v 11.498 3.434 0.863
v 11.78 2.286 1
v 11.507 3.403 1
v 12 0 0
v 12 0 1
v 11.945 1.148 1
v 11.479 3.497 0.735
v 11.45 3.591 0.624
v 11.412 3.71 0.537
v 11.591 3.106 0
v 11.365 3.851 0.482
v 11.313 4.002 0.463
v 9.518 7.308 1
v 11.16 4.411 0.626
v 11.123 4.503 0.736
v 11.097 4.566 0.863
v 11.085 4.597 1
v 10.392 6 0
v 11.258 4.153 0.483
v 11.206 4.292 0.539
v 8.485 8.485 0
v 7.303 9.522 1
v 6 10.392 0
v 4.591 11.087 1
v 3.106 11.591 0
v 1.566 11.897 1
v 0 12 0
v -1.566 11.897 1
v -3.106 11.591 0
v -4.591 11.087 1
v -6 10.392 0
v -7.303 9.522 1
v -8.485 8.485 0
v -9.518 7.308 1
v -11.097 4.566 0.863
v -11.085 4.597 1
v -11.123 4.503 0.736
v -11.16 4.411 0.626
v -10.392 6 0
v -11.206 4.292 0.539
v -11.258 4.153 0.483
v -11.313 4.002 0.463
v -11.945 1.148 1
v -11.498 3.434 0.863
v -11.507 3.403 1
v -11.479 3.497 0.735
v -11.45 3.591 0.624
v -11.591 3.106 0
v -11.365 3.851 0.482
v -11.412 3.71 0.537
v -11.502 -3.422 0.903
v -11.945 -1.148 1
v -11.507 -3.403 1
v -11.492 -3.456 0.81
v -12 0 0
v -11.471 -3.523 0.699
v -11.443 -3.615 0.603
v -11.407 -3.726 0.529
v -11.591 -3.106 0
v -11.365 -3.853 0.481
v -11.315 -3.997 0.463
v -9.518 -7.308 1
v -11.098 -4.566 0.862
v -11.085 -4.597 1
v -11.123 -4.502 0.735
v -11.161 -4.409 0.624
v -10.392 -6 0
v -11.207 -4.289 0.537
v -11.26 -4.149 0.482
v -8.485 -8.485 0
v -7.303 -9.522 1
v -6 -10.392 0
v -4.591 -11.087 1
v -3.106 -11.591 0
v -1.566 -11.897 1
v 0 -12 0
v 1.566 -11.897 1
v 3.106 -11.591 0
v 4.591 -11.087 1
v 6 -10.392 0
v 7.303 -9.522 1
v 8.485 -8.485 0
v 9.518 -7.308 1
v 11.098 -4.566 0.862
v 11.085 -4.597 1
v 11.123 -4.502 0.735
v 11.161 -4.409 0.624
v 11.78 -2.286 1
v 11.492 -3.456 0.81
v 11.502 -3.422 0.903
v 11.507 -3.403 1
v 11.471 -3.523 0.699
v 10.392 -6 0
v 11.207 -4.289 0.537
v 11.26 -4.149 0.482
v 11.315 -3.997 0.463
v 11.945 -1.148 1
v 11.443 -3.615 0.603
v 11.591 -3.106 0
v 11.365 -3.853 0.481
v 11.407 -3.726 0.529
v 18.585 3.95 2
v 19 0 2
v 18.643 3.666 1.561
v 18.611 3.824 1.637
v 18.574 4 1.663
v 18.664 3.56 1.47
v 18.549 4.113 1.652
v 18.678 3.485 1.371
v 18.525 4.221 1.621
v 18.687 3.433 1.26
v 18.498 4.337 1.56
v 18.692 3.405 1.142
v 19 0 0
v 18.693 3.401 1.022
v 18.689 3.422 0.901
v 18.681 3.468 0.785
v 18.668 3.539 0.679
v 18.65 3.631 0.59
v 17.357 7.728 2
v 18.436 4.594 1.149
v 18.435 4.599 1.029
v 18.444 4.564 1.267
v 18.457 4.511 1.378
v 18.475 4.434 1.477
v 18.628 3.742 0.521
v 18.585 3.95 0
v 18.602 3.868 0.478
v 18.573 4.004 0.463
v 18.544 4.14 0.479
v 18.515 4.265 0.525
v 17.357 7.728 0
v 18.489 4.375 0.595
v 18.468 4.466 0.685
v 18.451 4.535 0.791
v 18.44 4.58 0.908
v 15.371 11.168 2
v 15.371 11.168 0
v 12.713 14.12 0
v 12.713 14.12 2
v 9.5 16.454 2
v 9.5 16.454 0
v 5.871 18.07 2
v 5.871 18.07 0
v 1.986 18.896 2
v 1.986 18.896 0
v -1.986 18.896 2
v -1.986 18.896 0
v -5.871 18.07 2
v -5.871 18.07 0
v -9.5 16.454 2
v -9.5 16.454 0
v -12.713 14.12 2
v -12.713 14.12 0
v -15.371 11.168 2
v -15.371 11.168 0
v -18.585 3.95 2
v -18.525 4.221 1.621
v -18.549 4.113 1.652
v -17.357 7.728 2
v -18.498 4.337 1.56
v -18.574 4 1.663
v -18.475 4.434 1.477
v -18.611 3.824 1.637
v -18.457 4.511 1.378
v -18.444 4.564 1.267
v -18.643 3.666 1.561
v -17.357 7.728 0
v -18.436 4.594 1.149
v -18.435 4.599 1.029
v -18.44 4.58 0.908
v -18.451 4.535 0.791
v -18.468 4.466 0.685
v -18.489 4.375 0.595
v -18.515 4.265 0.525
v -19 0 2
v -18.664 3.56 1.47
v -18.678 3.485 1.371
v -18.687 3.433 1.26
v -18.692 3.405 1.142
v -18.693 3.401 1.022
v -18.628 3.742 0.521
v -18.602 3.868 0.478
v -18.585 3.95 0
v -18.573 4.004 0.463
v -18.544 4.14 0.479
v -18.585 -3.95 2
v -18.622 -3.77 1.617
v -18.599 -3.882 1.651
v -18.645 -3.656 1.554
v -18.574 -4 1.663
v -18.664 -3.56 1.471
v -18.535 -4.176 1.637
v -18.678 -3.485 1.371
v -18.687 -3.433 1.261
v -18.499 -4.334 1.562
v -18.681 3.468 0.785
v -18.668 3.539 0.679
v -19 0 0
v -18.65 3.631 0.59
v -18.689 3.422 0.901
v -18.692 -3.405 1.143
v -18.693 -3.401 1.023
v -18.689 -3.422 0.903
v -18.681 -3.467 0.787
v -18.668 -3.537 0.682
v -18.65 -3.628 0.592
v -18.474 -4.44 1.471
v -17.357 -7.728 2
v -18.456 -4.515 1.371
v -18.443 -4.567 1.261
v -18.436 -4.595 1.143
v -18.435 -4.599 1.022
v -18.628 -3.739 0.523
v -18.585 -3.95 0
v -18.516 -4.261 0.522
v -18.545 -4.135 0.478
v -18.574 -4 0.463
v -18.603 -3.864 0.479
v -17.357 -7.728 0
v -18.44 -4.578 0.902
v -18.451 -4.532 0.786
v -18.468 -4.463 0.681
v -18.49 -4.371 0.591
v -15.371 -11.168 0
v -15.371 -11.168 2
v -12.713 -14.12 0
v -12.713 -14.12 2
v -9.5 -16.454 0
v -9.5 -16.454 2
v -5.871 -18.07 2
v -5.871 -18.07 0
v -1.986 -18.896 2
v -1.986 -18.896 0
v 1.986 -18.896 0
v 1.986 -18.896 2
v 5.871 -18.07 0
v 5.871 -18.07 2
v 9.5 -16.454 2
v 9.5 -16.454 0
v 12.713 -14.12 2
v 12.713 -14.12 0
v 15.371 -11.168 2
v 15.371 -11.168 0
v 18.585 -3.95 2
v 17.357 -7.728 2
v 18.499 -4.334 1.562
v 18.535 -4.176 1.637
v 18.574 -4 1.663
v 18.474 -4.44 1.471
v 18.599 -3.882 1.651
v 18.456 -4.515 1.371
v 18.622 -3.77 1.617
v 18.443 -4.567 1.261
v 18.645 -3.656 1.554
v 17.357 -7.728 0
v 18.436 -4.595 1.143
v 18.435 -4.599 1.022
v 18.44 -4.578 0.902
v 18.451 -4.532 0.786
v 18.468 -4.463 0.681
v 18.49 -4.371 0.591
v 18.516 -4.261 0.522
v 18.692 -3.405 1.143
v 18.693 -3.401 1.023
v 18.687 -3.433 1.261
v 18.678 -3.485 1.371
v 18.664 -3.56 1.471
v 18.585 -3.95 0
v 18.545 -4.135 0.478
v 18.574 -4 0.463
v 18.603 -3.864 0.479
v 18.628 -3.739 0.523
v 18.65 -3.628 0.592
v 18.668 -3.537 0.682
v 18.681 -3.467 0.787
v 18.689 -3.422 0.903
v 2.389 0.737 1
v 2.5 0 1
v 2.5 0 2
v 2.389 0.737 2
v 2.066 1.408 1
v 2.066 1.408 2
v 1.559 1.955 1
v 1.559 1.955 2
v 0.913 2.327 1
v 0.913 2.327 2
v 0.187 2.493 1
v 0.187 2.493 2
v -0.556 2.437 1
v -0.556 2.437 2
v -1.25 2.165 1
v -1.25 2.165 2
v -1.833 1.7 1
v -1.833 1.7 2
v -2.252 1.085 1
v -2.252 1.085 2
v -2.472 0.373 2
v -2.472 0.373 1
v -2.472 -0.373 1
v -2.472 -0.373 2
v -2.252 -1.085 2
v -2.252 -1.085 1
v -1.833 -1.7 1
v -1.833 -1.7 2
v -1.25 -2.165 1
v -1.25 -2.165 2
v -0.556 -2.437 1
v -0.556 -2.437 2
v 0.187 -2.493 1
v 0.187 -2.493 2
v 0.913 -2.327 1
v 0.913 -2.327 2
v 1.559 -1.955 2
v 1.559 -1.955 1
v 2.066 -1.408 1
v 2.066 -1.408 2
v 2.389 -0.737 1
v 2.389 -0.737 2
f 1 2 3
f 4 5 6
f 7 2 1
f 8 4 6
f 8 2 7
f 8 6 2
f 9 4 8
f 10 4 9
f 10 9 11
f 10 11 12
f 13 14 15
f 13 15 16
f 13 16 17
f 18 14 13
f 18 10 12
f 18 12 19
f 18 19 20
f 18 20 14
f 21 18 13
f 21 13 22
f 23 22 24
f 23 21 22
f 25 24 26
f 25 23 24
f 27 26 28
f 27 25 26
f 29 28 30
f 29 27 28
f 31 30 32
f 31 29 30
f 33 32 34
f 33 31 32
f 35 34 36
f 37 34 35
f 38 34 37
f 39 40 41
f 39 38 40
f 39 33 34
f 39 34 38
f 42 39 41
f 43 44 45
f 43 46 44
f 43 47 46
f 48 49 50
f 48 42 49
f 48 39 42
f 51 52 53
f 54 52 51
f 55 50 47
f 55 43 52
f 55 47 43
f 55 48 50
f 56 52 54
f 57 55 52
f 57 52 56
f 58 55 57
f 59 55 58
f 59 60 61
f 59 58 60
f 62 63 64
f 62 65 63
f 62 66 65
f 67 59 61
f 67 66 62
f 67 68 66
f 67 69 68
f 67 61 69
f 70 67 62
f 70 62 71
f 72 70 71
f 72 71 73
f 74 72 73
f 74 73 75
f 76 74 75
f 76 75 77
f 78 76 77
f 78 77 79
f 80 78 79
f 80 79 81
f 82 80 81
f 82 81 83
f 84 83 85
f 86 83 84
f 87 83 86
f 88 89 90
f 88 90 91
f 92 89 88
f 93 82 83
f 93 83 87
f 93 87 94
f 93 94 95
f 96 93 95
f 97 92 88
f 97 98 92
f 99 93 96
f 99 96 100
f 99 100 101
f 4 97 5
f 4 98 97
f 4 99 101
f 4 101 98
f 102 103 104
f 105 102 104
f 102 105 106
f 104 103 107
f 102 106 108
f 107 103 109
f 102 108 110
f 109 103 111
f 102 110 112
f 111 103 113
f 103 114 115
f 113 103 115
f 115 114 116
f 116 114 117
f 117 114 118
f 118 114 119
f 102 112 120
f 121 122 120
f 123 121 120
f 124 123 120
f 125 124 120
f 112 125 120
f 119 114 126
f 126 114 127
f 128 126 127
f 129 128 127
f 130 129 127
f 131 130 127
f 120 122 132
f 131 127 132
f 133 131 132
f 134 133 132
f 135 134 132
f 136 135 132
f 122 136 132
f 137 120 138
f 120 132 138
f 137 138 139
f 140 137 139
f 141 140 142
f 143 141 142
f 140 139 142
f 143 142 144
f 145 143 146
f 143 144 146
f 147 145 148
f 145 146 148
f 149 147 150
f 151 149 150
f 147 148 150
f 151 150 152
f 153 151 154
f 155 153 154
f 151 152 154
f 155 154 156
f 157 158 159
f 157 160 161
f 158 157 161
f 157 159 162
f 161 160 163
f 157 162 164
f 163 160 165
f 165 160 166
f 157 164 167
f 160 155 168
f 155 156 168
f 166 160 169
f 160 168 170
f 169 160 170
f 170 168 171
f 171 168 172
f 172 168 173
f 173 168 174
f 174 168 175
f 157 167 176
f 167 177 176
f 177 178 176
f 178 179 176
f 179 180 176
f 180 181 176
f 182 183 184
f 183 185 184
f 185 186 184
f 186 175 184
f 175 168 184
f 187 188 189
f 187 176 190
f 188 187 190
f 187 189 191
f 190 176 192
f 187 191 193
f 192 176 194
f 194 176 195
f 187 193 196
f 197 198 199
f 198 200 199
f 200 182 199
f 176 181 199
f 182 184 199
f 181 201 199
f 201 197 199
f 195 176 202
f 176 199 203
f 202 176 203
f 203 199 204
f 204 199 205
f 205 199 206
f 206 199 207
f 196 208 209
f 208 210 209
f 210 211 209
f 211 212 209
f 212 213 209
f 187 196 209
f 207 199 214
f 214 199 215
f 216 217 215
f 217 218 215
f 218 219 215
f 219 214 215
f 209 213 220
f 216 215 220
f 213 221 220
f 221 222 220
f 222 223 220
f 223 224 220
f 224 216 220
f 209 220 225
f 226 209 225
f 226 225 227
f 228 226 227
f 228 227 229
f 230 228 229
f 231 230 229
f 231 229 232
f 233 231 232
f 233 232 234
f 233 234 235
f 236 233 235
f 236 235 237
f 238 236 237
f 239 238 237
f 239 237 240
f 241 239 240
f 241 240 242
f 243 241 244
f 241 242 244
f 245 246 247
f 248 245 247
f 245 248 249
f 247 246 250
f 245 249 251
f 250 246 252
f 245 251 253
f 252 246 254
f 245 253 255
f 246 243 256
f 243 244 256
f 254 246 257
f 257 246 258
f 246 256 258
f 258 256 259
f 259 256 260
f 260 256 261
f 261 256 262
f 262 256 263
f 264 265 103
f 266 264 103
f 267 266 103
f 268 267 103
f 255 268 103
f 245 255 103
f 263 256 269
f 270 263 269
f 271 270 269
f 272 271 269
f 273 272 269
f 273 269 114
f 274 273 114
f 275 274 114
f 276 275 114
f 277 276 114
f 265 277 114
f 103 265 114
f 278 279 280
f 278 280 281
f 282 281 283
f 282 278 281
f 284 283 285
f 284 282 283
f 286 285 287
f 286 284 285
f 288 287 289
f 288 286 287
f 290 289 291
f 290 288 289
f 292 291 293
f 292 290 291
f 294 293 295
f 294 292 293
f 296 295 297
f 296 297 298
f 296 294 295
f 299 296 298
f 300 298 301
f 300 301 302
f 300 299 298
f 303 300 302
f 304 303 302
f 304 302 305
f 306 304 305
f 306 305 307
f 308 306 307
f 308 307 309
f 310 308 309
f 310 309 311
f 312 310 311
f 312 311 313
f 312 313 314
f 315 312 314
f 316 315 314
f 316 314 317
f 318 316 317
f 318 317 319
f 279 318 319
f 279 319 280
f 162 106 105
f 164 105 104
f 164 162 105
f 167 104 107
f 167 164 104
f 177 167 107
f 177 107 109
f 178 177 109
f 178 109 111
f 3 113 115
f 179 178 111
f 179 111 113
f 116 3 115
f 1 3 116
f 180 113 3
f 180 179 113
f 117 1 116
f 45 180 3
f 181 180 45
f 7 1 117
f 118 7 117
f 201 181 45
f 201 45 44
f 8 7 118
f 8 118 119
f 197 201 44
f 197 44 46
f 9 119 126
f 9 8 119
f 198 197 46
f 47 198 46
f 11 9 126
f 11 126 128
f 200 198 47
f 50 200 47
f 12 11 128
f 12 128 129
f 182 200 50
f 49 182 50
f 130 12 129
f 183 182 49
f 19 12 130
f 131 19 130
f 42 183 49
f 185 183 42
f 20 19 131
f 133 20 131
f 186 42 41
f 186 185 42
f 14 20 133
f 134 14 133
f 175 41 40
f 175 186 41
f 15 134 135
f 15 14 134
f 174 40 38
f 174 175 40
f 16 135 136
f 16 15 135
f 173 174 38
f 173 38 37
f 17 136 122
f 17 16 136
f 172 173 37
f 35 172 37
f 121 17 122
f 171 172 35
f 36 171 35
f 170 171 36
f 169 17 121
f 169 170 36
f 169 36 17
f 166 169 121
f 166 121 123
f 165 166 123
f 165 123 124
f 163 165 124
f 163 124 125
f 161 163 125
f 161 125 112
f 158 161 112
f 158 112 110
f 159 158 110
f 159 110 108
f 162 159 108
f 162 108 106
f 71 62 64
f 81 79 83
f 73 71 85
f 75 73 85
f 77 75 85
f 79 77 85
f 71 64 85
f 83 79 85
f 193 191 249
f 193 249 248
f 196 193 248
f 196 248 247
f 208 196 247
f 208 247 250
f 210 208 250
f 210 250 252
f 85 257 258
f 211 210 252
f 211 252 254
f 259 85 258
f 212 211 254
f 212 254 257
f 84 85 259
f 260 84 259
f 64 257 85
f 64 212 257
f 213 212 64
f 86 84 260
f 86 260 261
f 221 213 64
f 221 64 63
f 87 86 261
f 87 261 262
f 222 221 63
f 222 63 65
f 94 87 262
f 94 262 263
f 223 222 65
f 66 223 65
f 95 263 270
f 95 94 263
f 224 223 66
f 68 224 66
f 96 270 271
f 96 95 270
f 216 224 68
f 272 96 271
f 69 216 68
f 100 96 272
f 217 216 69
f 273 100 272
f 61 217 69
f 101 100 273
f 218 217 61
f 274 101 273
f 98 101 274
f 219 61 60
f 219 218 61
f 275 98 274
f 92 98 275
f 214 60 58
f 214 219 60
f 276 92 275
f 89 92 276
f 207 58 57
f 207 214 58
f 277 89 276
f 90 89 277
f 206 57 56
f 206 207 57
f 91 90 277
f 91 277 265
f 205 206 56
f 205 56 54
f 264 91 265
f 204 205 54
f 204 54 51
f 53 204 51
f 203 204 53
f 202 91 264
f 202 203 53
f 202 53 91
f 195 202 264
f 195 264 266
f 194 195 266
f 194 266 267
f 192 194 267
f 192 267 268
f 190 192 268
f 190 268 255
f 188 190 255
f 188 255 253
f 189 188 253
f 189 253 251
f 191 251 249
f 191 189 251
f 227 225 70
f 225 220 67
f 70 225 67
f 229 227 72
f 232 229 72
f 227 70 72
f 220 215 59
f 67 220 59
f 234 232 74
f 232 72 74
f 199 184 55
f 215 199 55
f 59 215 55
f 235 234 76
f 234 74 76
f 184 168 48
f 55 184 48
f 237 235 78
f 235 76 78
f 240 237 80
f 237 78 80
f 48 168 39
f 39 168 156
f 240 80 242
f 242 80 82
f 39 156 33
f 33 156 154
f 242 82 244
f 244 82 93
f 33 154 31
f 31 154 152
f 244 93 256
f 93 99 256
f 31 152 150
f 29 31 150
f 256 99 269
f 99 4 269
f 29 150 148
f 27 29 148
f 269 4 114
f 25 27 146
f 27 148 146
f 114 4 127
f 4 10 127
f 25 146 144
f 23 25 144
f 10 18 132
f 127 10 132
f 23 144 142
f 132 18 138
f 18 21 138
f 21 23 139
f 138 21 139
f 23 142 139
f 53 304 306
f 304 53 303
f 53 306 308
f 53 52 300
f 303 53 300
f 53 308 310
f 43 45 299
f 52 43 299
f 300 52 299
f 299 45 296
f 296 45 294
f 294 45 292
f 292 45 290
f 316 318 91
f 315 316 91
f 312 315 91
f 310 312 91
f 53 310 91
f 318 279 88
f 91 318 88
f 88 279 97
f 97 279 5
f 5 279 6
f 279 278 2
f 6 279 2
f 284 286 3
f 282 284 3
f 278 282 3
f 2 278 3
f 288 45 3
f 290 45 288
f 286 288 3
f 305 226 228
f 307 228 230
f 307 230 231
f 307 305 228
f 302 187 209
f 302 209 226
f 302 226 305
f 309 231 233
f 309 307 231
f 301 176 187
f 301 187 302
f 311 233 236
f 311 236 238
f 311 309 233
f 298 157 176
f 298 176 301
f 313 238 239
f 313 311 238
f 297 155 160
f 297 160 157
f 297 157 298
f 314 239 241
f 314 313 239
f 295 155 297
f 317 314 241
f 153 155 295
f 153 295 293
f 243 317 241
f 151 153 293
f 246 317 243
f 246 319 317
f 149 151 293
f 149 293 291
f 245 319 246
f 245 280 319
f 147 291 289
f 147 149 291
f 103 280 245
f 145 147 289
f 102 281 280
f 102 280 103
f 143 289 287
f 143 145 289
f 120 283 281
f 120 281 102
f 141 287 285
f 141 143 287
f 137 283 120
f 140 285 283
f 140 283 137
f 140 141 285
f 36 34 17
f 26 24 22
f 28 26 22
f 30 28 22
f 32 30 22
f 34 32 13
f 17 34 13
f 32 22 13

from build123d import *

# Parameters (mm, degrees)
SKETCH1_R                = 19
SKETCH1_R_2              = 7.5
SKETCH1_R_3              = 2.5
BOSS_EXTRUDE5_DEPTH      = 2
SKETCH10_R               = 12
CUT_EXTRUDE33_DEPTH      = 1
CUT_EXTRUDE34_DEPTH      = 40
CUT_EXTRUDE34_DEPTH_BACK = 34
SKETCH14_R               = 0.6


with BuildPart() as part:
    # Sketch1 → Boss-Extrude5 (new body)
    # profile 1 of 2: a face of its own
    with BuildSketch(Plane.XY):
        Circle(SKETCH1_R)
        Circle(SKETCH1_R_2, mode=Mode.SUBTRACT)
    # profile 2 of 2: a face of its own
    with BuildSketch(Plane.XY):
        Circle(SKETCH1_R_2)
        Circle(SKETCH1_R_3, mode=Mode.SUBTRACT)
    extrude(amount=BOSS_EXTRUDE5_DEPTH)

    # Sketch10 → Cut-Extrude33 (cut)
    with BuildSketch(Plane.XY):
        Circle(SKETCH10_R)
    extrude(amount=CUT_EXTRUDE33_DEPTH, mode=Mode.SUBTRACT)

    # Sketch14 → Cut-Extrude34 (cut, two sides: drawn at the far end of the back side and taken through both)
    with BuildSketch(Plane(origin=(0, 0, 0), x_dir=(0, 0, -1), z_dir=(1, 0, 0)).offset(-CUT_EXTRUDE34_DEPTH_BACK)):
        with Locations(Location((-1.062968904, 4, 0), (0, 0, 180))):
            Circle(SKETCH14_R)
        with Locations(Location((-1.062968904, -4, 0), (0, 0, 180))):
            Circle(SKETCH14_R)
    extrude(amount=CUT_EXTRUDE34_DEPTH + CUT_EXTRUDE34_DEPTH_BACK, mode=Mode.SUBTRACT)


solid = part.part
